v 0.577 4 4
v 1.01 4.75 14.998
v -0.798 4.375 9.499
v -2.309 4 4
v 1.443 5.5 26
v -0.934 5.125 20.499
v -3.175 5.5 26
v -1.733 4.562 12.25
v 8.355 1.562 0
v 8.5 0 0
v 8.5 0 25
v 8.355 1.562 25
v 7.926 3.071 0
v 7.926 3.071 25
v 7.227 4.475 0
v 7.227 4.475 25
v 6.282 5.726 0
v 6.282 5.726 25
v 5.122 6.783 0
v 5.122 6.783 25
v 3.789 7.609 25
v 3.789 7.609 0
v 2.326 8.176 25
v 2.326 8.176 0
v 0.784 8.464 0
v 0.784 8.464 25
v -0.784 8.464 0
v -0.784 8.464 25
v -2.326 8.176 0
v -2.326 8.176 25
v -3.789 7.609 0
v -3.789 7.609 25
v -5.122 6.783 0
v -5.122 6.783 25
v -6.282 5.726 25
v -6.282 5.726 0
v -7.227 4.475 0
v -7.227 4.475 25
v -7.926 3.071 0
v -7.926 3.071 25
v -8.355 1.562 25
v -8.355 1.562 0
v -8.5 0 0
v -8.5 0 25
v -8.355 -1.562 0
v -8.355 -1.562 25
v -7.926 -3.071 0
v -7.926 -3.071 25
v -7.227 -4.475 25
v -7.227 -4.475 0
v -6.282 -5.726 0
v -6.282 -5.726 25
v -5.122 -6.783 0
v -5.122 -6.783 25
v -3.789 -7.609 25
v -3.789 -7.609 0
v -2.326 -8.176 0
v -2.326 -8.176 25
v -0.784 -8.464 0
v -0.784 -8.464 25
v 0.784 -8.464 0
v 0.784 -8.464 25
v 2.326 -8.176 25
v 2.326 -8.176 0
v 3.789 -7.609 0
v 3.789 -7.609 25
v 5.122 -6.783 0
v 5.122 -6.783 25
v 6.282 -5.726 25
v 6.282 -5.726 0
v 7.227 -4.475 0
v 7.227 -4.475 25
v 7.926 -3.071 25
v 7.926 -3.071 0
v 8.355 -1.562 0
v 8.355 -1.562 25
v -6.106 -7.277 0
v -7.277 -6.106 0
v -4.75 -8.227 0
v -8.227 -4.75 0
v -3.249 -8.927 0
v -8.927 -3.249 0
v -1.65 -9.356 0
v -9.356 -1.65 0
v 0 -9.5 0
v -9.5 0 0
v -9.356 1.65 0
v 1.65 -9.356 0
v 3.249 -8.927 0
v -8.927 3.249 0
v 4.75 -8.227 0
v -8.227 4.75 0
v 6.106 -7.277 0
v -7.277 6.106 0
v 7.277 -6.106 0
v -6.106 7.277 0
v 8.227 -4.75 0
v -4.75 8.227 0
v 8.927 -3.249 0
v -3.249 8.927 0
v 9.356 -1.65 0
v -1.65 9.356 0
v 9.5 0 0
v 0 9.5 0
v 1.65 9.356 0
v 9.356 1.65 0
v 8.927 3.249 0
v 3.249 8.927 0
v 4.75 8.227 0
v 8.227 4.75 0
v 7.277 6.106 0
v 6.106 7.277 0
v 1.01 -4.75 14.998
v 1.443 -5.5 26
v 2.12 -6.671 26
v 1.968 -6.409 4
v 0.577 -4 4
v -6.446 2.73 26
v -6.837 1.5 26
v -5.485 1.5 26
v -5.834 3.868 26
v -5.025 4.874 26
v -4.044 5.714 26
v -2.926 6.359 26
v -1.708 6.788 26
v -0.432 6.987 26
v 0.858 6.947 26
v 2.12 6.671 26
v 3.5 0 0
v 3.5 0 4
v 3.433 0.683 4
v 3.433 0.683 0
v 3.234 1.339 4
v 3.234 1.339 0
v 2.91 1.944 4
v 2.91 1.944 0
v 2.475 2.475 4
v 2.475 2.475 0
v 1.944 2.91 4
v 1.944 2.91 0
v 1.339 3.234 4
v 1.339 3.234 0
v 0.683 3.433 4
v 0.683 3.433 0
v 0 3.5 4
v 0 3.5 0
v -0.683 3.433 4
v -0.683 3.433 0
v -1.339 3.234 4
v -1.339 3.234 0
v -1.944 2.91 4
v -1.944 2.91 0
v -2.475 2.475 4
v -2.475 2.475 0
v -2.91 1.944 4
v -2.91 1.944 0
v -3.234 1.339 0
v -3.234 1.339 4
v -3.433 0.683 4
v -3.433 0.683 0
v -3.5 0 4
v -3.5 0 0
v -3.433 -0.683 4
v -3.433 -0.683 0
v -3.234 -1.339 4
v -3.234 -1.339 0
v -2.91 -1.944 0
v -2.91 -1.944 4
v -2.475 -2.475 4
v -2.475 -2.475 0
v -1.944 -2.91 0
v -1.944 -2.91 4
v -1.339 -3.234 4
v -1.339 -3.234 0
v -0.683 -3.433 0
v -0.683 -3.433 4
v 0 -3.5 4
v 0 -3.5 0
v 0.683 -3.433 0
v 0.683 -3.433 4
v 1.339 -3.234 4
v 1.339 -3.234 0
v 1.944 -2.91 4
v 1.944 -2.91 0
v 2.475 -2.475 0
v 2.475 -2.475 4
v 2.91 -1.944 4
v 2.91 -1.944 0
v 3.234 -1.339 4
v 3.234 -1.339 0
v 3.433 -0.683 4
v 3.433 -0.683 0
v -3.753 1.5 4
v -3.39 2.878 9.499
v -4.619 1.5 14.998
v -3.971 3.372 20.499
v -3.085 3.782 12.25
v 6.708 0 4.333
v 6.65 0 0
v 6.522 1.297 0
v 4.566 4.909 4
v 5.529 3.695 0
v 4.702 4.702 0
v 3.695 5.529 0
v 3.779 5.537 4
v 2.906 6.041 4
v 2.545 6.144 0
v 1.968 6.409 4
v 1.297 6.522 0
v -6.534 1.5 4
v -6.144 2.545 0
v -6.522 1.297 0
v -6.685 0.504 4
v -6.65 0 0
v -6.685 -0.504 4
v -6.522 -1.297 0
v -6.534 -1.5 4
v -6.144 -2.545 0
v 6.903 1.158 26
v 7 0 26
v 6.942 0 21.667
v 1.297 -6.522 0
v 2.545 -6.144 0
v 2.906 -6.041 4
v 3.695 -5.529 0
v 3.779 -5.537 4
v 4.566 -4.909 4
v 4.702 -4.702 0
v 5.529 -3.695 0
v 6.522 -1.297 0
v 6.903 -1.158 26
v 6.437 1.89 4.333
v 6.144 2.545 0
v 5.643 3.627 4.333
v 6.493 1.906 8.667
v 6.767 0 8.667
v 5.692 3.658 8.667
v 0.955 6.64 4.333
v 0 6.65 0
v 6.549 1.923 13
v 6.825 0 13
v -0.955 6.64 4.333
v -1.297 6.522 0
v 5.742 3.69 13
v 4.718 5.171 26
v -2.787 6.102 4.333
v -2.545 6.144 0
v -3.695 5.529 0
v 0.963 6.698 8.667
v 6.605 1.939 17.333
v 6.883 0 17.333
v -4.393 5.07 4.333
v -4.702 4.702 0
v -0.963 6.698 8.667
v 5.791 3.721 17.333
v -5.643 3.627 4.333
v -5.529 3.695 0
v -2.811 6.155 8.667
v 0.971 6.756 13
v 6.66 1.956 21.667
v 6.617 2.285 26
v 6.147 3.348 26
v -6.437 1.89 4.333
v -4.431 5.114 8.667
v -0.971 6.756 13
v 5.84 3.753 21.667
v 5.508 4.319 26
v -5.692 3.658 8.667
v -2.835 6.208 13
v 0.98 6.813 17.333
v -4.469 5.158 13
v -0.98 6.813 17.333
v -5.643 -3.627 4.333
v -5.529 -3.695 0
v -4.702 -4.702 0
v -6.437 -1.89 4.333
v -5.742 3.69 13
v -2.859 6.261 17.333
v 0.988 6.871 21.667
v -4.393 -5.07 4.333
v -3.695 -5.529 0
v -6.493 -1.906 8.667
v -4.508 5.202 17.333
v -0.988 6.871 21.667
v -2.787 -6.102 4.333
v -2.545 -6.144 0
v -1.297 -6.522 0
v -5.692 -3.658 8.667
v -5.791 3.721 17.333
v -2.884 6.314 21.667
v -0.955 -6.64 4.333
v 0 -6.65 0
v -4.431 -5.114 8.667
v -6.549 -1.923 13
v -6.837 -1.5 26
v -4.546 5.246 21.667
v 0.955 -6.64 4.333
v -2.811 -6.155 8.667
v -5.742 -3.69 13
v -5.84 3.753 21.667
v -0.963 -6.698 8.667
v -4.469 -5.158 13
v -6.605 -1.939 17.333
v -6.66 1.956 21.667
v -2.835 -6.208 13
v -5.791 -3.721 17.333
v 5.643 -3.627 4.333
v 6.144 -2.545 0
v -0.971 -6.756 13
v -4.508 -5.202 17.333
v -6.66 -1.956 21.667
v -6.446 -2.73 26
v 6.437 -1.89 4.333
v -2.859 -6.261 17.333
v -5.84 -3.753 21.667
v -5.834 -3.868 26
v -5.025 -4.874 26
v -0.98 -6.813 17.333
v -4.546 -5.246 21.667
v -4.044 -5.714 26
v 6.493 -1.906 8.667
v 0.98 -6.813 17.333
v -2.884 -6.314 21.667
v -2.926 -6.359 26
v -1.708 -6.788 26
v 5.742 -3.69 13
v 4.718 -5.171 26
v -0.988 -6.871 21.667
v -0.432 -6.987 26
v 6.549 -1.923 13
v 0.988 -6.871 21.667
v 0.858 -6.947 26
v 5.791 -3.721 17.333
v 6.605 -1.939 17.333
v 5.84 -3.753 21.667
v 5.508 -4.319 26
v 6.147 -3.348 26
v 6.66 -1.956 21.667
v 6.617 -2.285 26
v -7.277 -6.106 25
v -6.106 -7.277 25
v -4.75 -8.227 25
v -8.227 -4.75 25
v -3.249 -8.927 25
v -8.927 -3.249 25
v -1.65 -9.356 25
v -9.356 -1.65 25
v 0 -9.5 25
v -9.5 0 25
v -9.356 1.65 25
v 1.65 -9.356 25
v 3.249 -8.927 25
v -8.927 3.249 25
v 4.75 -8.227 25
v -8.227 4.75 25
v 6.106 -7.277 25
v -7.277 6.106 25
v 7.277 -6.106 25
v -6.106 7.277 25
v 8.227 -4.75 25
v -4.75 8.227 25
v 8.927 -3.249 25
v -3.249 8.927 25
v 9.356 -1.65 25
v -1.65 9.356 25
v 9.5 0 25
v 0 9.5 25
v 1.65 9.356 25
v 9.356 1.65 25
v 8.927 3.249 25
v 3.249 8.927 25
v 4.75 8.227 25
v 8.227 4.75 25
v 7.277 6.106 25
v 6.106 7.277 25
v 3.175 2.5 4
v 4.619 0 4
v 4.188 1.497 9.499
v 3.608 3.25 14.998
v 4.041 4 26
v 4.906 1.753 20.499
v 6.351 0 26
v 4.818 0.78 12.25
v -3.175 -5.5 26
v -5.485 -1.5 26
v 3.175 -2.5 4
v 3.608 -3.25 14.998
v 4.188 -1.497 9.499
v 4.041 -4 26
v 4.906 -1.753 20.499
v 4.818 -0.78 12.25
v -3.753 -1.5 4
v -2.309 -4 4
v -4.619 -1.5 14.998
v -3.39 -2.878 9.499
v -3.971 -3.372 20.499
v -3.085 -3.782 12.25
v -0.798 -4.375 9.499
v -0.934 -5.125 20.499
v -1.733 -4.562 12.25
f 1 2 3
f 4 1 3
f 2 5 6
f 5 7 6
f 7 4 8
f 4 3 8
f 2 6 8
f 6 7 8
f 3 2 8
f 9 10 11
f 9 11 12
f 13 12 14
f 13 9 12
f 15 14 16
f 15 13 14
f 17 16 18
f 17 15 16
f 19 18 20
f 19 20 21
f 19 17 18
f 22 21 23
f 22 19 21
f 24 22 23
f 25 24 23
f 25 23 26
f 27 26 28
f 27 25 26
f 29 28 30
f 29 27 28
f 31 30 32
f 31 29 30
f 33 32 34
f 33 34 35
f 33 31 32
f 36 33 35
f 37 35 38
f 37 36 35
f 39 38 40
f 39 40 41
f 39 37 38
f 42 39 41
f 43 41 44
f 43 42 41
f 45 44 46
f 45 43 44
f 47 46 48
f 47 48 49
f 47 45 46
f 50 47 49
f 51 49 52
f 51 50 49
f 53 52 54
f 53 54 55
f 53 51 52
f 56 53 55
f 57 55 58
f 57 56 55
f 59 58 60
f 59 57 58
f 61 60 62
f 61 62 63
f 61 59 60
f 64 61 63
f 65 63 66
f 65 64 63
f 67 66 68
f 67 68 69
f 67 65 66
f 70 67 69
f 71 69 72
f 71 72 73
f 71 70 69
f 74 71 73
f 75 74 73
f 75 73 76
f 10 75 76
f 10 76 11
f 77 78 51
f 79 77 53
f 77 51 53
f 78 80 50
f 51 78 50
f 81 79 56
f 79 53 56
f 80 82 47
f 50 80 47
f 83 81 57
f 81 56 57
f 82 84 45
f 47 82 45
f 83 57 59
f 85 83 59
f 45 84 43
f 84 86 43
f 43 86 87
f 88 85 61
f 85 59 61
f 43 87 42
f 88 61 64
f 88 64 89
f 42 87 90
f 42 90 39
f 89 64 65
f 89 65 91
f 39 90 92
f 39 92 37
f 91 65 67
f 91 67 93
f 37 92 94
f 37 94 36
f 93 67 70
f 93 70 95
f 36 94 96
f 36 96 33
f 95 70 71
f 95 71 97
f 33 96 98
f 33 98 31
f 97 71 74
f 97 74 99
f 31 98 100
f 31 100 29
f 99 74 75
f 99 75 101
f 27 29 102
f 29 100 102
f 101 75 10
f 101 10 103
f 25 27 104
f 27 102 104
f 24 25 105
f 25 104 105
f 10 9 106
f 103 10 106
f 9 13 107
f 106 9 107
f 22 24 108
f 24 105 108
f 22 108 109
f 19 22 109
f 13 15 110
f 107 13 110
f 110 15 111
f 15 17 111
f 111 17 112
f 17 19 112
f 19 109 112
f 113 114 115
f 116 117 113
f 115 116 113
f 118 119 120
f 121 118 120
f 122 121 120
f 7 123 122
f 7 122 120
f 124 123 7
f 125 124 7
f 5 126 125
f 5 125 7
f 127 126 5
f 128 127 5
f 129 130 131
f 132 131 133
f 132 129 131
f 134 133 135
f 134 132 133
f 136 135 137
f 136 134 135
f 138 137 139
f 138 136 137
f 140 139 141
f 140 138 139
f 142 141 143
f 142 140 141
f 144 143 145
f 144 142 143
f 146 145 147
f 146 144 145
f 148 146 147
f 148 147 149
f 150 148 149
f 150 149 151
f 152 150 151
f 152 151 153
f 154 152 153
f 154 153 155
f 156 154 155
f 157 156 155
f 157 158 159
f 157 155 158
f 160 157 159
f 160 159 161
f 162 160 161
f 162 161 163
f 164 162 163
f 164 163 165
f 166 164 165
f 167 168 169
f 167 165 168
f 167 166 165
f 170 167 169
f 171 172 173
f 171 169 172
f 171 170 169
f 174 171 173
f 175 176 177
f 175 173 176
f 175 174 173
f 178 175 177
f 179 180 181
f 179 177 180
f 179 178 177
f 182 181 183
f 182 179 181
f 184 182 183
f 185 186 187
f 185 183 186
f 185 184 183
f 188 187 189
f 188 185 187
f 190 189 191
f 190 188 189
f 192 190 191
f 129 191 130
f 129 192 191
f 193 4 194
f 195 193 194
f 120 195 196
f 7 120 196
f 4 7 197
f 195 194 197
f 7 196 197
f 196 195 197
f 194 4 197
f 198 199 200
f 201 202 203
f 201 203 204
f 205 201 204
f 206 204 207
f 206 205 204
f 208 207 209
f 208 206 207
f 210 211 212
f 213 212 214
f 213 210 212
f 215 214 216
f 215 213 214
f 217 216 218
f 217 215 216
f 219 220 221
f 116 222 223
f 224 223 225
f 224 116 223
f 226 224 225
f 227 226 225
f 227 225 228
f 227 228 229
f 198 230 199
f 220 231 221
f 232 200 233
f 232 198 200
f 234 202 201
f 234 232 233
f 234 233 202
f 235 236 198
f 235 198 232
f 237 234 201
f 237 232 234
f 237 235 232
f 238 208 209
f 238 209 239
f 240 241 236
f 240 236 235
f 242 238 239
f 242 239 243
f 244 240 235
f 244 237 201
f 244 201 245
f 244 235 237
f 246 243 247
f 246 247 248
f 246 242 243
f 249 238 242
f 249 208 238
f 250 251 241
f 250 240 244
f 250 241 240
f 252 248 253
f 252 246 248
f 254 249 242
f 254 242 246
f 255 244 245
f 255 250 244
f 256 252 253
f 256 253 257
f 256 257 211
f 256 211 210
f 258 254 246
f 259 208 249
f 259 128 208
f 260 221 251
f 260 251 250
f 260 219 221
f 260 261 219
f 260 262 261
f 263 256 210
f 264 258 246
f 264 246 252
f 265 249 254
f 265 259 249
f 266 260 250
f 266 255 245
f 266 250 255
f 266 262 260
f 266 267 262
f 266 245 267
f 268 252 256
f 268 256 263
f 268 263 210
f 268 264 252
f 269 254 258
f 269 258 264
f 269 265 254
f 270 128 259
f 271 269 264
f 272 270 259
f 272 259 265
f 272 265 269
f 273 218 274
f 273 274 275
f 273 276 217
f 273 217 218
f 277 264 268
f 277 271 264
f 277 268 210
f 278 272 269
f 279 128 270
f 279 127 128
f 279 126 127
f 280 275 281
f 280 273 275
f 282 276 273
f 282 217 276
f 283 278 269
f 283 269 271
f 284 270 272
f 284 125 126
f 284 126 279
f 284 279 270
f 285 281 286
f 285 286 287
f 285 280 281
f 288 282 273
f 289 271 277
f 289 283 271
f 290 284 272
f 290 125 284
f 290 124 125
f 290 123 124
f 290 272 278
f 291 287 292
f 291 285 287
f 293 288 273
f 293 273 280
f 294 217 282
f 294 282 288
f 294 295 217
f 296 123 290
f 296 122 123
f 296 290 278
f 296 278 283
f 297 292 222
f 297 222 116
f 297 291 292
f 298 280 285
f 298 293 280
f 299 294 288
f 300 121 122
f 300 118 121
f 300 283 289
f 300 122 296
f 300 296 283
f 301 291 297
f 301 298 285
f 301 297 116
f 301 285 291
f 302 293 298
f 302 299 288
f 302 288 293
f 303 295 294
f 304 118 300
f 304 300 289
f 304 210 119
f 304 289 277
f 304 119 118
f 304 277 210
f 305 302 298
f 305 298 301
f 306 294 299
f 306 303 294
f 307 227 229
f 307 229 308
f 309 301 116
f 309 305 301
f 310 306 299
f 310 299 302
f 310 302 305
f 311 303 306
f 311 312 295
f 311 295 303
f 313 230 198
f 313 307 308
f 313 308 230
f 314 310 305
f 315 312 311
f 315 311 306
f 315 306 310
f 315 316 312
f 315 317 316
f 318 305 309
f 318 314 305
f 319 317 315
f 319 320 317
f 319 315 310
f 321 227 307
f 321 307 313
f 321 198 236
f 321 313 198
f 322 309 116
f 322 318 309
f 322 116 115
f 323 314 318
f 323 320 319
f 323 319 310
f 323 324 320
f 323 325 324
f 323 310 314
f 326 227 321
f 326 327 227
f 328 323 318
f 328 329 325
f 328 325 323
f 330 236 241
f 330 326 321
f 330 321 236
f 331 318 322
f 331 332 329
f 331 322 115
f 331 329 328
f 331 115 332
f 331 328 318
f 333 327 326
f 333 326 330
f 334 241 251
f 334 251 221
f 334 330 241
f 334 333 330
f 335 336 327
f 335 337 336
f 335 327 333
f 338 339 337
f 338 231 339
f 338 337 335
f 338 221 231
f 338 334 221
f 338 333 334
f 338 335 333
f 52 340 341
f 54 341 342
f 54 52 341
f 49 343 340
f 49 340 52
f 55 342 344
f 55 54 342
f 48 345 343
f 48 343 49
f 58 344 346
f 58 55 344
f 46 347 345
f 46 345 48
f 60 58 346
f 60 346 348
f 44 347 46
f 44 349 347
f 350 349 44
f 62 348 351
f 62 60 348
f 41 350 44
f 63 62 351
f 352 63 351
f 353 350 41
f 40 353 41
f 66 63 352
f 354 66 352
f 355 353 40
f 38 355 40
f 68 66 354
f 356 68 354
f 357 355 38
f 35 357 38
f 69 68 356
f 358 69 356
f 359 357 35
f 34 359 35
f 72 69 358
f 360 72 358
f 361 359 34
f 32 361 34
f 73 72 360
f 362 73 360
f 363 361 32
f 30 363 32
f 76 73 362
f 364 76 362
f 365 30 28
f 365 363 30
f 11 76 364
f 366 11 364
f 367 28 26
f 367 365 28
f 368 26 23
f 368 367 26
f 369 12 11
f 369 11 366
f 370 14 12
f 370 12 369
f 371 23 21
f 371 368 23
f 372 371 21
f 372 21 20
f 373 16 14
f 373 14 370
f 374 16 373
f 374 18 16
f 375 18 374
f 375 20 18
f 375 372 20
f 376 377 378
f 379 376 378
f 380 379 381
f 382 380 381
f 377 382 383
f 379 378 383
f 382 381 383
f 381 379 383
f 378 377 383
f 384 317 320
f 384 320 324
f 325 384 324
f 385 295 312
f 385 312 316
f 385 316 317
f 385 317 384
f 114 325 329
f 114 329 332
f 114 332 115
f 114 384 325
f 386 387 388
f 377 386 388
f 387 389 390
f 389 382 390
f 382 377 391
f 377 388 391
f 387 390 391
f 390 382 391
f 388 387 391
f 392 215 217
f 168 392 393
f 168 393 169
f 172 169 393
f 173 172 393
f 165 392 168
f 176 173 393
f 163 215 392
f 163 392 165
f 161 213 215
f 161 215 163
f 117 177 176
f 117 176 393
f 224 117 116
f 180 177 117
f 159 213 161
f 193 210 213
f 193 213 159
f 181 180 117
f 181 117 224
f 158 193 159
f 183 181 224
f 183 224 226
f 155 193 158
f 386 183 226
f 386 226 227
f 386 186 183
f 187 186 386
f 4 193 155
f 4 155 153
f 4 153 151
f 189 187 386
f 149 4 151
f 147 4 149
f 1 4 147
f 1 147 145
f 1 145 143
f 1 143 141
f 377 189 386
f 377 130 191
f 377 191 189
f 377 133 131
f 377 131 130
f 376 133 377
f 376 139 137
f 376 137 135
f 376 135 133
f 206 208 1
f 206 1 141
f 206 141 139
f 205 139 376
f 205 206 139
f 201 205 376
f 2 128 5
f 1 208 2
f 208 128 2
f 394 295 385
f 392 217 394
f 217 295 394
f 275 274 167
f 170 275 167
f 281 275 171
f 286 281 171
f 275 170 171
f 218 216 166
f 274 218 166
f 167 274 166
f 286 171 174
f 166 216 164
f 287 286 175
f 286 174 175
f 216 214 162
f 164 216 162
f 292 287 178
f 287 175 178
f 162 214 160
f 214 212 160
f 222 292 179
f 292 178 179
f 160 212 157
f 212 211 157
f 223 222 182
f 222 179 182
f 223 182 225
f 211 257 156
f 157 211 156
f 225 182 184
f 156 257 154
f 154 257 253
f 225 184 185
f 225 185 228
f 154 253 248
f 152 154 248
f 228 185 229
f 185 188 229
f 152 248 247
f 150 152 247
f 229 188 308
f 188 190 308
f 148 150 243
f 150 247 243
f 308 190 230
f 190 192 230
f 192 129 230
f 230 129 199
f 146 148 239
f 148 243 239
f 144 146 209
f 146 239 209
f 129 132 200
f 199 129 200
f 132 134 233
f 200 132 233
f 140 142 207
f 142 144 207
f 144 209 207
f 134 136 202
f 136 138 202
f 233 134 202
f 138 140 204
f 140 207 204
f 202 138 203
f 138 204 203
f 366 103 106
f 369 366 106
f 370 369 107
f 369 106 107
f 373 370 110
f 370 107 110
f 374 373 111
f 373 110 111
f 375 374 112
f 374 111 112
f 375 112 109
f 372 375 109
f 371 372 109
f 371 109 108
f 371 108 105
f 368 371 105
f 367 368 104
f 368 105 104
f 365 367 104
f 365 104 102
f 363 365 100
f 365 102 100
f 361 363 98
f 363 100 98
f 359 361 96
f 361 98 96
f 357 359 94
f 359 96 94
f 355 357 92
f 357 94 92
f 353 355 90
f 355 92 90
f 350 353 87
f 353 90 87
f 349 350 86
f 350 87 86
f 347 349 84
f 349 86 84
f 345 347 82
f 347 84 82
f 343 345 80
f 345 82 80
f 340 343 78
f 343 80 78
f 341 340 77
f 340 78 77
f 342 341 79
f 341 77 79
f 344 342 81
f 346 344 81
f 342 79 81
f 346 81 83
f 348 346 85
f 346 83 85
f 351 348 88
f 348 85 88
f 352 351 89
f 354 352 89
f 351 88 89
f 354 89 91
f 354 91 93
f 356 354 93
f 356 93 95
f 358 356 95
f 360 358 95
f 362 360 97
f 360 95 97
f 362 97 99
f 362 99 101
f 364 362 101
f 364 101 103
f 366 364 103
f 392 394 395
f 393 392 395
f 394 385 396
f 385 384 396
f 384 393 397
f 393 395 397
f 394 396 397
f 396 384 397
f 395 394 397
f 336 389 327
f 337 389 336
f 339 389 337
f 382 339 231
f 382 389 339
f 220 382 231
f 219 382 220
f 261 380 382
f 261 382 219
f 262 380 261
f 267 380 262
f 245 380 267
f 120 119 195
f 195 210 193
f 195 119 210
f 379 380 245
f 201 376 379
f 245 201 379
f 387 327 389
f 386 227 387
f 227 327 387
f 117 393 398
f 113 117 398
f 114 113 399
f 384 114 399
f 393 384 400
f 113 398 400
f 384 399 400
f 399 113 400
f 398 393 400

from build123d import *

# Parameters (mm, degrees)
F1_R      = 6.65
F3_R      = 7
F2_R      = 3.5
F5_DEPTH  = 32
F9_W      = 10
F9_H      = 3
F11_DEPTH = 25
F12_R     = 9.5
F12_R_2   = 8.5
F13_DEPTH = 25


with BuildPart() as f4:
    # F1 (on Top) → F4 section 0
    with BuildSketch(Plane.XY):
        Circle(F1_R)
    # F3 (on offset) → F4 section 1
    with BuildSketch(Plane.XY.offset(26)):
        Circle(F3_R)
    loft()

    # F2 (on Top) → F5 (cut)
    with BuildSketch(Plane.XY):
        Circle(F2_R)
    extrude(amount=F5_DEPTH, mode=Mode.SUBTRACT)

    # F7 (on offset) → F10 section 0
    with BuildSketch(Plane.XY.offset(4)):
        Polygon((-2.309401, 4), (-4.618802, 0), (-2.309401, -4), (2.309401, -4), (4.618802, 0), (2.309401, 4), align=None)
    # F8 (on offset) → F10 section 1
    with BuildSketch(Plane.XY.offset(26)):
        Polygon((6.350853, 0), (3.175426, 5.5), (-3.175426, 5.5), (-6.350853, 0), (-3.175426, -5.5), (3.175426, -5.5), align=None)
    loft(mode=Mode.SUBTRACT)

    # F9 (on offset) → F11 (cut)
    with BuildSketch(Plane.XY.offset(4)):
        with Locations((-6.366908, 0)):
            Rectangle(F9_W, F9_H)
        Polygon((-0.615584, -1.933777), (4.384416, -10.594031), (6.982492, -9.094031), (1.982492, -0.433777), align=None)
        Polygon((1.982492, 0.433777), (6.982492, 9.094031), (4.384416, 10.594031), (-0.615584, 1.933777), align=None)
    extrude(amount=F11_DEPTH, mode=Mode.SUBTRACT)


with BuildPart() as f13:
    # F12 (on Top) → F13 (new body)
    with BuildSketch(Plane.XY):
        Circle(F12_R)
        Circle(F12_R_2, mode=Mode.SUBTRACT)
    extrude(amount=F13_DEPTH)


solid = Compound([f4.part, f13.part])
